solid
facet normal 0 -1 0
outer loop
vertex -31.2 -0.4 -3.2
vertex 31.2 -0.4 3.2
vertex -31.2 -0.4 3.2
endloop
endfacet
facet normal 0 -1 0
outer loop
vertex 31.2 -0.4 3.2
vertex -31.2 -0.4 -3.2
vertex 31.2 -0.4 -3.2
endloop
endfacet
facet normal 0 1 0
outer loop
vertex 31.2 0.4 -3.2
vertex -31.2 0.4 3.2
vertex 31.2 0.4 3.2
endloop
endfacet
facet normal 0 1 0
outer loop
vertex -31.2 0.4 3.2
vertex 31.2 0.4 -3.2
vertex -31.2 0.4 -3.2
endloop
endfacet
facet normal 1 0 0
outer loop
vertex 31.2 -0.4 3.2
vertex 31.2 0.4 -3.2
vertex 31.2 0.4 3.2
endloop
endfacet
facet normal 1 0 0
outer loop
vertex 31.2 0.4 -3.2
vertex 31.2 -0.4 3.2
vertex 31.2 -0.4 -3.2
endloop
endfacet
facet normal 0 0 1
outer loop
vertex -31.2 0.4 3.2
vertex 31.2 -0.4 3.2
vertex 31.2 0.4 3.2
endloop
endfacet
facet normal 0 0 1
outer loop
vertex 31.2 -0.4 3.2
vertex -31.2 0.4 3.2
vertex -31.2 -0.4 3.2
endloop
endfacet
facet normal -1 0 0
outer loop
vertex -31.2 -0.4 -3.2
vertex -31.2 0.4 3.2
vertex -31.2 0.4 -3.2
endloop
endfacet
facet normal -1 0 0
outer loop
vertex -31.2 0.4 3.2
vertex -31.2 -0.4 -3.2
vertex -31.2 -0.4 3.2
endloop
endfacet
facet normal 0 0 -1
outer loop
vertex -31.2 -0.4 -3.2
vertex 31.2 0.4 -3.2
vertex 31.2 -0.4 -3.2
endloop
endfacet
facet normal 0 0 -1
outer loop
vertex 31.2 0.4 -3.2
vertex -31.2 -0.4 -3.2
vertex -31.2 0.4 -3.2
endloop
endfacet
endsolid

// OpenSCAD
// file: ../p/box.scad
use <../lib.scad>
function ldraw_lib__box() = [
// 0 Box 6 (six faces)
// 0 Name: box.dat
// 0 Author: James Jessiman
// 0 !LDRAW_ORG Primitive UPDATE 2002-05
// 0 !LICENSE Licensed under CC BY 4.0 : see CAreadme.txt
// 
// 0 BFC CERTIFY CCW
  [0,"BFC","CERTIFY"],
  [0,"BFC","CCW"],
// 
// 0 !HISTORY 2002-08-22 [sbliss] Applied BFC
// 0 !HISTORY 2002-11-30 [PTadmin] Official Update 2002-05
// 0 !HISTORY 2007-06-24 [PTadmin] Header formatted for Contributor Agreement
// 0 !HISTORY 2008-07-01 [PTadmin] Official Update 2008-01
// 
// 
// 2 24 1 1 1 -1 1 1
  [2,24,1,1,1,-1,1,1],
// 2 24 -1 1 1 -1 1 -1
  [2,24,-1,1,1,-1,1,-1],
// 2 24 -1 1 -1 1 1 -1
  [2,24,-1,1,-1,1,1,-1],
// 2 24 1 1 -1 1 1 1
  [2,24,1,1,-1,1,1,1],
// 2 24 1 -1 1 -1 -1 1
  [2,24,1,-1,1,-1,-1,1],
// 2 24 -1 -1 1 -1 -1 -1
  [2,24,-1,-1,1,-1,-1,-1],
// 2 24 -1 -1 -1 1 -1 -1
  [2,24,-1,-1,-1,1,-1,-1],
// 2 24 1 -1 -1 1 -1 1
  [2,24,1,-1,-1,1,-1,1],
// 2 24 1 -1 1 1 1 1
  [2,24,1,-1,1,1,1,1],
// 2 24 -1 -1 1 -1 1 1
  [2,24,-1,-1,1,-1,1,1],
// 2 24 1 -1 -1 1 1 -1
  [2,24,1,-1,-1,1,1,-1],
// 2 24 -1 -1 -1 -1 1 -1
  [2,24,-1,-1,-1,-1,1,-1],
// 4 16 1 1 1 1 1 -1 -1 1 -1 -1 1 1
  [4,16,1,1,1,1,1,-1,-1,1,-1,-1,1,1],
// 4 16 -1 -1 -1 1 -1 -1 1 -1 1 -1 -1 1
  [4,16,-1,-1,-1,1,-1,-1,1,-1,1,-1,-1,1],
// 4 16 -1 -1 1 1 -1 1 1 1 1 -1 1 1
  [4,16,-1,-1,1,1,-1,1,1,1,1,-1,1,1],
// 4 16 -1 -1 -1 -1 -1 1 -1 1 1 -1 1 -1
  [4,16,-1,-1,-1,-1,-1,1,-1,1,1,-1,1,-1],
// 4 16 1 -1 -1 -1 -1 -1 -1 1 -1 1 1 -1
  [4,16,1,-1,-1,-1,-1,-1,-1,1,-1,1,1,-1],
// 4 16 1 -1 1 1 -1 -1 1 1 -1 1 1 1
  [4,16,1,-1,1,1,-1,-1,1,1,-1,1,1,1],
// 0
];
module ldraw_lib__box(step=0, col=false, unit=2/5, alt=false, line=0.2, solid=!$preview)
    makepoly(ldraw_lib__box(), step=step, col=col, unit=unit, alt=alt, line=line, solid=solid);
ldraw_lib__box(line=0.2);
// main file
use <../lib.scad>
use <../p/box.scad>
function ldraw_lib__2499() = [
// 0 ~Electric Light & Sound Brick  1 x  8 with 3 Light Holes Lid
// 0 Name: 2499.dat
// 0 Author: Chris Dee [cwdee]
// 0 !LDRAW_ORG Part UPDATE 2020-03
// 0 !LICENSE Licensed under CC BY 4.0 : see CAreadme.txt
// 
// 0 BFC CERTIFY CCW
  [0,"BFC","CERTIFY"],
  [0,"BFC","CCW"],
// 
// 0 !HISTORY 2011-12-29 [PTadmin] Official Update 2011-02
// 0 !HISTORY 2020-07-20 [PTadmin] Renamed from u9042
// 0 !HISTORY 2020-12-29 [PTadmin] Official Update 2020-03
// 
// 
// 1 16 0 0 0 0 0 78 8 0 0 0 -1 0 box.dat
  [1,16,0,0,0,0,0,78,8,0,0,0,-1,0, ldraw_lib__box()],
// 0
];
module ldraw_lib__2499(step=0, col=false, unit=2/5, alt=false, line=0.2, solid=!$preview)
    makepoly(ldraw_lib__2499(), step=step, col=col, unit=unit, alt=alt, line=line, solid=solid);
ldraw_lib__2499(line=0.2);
